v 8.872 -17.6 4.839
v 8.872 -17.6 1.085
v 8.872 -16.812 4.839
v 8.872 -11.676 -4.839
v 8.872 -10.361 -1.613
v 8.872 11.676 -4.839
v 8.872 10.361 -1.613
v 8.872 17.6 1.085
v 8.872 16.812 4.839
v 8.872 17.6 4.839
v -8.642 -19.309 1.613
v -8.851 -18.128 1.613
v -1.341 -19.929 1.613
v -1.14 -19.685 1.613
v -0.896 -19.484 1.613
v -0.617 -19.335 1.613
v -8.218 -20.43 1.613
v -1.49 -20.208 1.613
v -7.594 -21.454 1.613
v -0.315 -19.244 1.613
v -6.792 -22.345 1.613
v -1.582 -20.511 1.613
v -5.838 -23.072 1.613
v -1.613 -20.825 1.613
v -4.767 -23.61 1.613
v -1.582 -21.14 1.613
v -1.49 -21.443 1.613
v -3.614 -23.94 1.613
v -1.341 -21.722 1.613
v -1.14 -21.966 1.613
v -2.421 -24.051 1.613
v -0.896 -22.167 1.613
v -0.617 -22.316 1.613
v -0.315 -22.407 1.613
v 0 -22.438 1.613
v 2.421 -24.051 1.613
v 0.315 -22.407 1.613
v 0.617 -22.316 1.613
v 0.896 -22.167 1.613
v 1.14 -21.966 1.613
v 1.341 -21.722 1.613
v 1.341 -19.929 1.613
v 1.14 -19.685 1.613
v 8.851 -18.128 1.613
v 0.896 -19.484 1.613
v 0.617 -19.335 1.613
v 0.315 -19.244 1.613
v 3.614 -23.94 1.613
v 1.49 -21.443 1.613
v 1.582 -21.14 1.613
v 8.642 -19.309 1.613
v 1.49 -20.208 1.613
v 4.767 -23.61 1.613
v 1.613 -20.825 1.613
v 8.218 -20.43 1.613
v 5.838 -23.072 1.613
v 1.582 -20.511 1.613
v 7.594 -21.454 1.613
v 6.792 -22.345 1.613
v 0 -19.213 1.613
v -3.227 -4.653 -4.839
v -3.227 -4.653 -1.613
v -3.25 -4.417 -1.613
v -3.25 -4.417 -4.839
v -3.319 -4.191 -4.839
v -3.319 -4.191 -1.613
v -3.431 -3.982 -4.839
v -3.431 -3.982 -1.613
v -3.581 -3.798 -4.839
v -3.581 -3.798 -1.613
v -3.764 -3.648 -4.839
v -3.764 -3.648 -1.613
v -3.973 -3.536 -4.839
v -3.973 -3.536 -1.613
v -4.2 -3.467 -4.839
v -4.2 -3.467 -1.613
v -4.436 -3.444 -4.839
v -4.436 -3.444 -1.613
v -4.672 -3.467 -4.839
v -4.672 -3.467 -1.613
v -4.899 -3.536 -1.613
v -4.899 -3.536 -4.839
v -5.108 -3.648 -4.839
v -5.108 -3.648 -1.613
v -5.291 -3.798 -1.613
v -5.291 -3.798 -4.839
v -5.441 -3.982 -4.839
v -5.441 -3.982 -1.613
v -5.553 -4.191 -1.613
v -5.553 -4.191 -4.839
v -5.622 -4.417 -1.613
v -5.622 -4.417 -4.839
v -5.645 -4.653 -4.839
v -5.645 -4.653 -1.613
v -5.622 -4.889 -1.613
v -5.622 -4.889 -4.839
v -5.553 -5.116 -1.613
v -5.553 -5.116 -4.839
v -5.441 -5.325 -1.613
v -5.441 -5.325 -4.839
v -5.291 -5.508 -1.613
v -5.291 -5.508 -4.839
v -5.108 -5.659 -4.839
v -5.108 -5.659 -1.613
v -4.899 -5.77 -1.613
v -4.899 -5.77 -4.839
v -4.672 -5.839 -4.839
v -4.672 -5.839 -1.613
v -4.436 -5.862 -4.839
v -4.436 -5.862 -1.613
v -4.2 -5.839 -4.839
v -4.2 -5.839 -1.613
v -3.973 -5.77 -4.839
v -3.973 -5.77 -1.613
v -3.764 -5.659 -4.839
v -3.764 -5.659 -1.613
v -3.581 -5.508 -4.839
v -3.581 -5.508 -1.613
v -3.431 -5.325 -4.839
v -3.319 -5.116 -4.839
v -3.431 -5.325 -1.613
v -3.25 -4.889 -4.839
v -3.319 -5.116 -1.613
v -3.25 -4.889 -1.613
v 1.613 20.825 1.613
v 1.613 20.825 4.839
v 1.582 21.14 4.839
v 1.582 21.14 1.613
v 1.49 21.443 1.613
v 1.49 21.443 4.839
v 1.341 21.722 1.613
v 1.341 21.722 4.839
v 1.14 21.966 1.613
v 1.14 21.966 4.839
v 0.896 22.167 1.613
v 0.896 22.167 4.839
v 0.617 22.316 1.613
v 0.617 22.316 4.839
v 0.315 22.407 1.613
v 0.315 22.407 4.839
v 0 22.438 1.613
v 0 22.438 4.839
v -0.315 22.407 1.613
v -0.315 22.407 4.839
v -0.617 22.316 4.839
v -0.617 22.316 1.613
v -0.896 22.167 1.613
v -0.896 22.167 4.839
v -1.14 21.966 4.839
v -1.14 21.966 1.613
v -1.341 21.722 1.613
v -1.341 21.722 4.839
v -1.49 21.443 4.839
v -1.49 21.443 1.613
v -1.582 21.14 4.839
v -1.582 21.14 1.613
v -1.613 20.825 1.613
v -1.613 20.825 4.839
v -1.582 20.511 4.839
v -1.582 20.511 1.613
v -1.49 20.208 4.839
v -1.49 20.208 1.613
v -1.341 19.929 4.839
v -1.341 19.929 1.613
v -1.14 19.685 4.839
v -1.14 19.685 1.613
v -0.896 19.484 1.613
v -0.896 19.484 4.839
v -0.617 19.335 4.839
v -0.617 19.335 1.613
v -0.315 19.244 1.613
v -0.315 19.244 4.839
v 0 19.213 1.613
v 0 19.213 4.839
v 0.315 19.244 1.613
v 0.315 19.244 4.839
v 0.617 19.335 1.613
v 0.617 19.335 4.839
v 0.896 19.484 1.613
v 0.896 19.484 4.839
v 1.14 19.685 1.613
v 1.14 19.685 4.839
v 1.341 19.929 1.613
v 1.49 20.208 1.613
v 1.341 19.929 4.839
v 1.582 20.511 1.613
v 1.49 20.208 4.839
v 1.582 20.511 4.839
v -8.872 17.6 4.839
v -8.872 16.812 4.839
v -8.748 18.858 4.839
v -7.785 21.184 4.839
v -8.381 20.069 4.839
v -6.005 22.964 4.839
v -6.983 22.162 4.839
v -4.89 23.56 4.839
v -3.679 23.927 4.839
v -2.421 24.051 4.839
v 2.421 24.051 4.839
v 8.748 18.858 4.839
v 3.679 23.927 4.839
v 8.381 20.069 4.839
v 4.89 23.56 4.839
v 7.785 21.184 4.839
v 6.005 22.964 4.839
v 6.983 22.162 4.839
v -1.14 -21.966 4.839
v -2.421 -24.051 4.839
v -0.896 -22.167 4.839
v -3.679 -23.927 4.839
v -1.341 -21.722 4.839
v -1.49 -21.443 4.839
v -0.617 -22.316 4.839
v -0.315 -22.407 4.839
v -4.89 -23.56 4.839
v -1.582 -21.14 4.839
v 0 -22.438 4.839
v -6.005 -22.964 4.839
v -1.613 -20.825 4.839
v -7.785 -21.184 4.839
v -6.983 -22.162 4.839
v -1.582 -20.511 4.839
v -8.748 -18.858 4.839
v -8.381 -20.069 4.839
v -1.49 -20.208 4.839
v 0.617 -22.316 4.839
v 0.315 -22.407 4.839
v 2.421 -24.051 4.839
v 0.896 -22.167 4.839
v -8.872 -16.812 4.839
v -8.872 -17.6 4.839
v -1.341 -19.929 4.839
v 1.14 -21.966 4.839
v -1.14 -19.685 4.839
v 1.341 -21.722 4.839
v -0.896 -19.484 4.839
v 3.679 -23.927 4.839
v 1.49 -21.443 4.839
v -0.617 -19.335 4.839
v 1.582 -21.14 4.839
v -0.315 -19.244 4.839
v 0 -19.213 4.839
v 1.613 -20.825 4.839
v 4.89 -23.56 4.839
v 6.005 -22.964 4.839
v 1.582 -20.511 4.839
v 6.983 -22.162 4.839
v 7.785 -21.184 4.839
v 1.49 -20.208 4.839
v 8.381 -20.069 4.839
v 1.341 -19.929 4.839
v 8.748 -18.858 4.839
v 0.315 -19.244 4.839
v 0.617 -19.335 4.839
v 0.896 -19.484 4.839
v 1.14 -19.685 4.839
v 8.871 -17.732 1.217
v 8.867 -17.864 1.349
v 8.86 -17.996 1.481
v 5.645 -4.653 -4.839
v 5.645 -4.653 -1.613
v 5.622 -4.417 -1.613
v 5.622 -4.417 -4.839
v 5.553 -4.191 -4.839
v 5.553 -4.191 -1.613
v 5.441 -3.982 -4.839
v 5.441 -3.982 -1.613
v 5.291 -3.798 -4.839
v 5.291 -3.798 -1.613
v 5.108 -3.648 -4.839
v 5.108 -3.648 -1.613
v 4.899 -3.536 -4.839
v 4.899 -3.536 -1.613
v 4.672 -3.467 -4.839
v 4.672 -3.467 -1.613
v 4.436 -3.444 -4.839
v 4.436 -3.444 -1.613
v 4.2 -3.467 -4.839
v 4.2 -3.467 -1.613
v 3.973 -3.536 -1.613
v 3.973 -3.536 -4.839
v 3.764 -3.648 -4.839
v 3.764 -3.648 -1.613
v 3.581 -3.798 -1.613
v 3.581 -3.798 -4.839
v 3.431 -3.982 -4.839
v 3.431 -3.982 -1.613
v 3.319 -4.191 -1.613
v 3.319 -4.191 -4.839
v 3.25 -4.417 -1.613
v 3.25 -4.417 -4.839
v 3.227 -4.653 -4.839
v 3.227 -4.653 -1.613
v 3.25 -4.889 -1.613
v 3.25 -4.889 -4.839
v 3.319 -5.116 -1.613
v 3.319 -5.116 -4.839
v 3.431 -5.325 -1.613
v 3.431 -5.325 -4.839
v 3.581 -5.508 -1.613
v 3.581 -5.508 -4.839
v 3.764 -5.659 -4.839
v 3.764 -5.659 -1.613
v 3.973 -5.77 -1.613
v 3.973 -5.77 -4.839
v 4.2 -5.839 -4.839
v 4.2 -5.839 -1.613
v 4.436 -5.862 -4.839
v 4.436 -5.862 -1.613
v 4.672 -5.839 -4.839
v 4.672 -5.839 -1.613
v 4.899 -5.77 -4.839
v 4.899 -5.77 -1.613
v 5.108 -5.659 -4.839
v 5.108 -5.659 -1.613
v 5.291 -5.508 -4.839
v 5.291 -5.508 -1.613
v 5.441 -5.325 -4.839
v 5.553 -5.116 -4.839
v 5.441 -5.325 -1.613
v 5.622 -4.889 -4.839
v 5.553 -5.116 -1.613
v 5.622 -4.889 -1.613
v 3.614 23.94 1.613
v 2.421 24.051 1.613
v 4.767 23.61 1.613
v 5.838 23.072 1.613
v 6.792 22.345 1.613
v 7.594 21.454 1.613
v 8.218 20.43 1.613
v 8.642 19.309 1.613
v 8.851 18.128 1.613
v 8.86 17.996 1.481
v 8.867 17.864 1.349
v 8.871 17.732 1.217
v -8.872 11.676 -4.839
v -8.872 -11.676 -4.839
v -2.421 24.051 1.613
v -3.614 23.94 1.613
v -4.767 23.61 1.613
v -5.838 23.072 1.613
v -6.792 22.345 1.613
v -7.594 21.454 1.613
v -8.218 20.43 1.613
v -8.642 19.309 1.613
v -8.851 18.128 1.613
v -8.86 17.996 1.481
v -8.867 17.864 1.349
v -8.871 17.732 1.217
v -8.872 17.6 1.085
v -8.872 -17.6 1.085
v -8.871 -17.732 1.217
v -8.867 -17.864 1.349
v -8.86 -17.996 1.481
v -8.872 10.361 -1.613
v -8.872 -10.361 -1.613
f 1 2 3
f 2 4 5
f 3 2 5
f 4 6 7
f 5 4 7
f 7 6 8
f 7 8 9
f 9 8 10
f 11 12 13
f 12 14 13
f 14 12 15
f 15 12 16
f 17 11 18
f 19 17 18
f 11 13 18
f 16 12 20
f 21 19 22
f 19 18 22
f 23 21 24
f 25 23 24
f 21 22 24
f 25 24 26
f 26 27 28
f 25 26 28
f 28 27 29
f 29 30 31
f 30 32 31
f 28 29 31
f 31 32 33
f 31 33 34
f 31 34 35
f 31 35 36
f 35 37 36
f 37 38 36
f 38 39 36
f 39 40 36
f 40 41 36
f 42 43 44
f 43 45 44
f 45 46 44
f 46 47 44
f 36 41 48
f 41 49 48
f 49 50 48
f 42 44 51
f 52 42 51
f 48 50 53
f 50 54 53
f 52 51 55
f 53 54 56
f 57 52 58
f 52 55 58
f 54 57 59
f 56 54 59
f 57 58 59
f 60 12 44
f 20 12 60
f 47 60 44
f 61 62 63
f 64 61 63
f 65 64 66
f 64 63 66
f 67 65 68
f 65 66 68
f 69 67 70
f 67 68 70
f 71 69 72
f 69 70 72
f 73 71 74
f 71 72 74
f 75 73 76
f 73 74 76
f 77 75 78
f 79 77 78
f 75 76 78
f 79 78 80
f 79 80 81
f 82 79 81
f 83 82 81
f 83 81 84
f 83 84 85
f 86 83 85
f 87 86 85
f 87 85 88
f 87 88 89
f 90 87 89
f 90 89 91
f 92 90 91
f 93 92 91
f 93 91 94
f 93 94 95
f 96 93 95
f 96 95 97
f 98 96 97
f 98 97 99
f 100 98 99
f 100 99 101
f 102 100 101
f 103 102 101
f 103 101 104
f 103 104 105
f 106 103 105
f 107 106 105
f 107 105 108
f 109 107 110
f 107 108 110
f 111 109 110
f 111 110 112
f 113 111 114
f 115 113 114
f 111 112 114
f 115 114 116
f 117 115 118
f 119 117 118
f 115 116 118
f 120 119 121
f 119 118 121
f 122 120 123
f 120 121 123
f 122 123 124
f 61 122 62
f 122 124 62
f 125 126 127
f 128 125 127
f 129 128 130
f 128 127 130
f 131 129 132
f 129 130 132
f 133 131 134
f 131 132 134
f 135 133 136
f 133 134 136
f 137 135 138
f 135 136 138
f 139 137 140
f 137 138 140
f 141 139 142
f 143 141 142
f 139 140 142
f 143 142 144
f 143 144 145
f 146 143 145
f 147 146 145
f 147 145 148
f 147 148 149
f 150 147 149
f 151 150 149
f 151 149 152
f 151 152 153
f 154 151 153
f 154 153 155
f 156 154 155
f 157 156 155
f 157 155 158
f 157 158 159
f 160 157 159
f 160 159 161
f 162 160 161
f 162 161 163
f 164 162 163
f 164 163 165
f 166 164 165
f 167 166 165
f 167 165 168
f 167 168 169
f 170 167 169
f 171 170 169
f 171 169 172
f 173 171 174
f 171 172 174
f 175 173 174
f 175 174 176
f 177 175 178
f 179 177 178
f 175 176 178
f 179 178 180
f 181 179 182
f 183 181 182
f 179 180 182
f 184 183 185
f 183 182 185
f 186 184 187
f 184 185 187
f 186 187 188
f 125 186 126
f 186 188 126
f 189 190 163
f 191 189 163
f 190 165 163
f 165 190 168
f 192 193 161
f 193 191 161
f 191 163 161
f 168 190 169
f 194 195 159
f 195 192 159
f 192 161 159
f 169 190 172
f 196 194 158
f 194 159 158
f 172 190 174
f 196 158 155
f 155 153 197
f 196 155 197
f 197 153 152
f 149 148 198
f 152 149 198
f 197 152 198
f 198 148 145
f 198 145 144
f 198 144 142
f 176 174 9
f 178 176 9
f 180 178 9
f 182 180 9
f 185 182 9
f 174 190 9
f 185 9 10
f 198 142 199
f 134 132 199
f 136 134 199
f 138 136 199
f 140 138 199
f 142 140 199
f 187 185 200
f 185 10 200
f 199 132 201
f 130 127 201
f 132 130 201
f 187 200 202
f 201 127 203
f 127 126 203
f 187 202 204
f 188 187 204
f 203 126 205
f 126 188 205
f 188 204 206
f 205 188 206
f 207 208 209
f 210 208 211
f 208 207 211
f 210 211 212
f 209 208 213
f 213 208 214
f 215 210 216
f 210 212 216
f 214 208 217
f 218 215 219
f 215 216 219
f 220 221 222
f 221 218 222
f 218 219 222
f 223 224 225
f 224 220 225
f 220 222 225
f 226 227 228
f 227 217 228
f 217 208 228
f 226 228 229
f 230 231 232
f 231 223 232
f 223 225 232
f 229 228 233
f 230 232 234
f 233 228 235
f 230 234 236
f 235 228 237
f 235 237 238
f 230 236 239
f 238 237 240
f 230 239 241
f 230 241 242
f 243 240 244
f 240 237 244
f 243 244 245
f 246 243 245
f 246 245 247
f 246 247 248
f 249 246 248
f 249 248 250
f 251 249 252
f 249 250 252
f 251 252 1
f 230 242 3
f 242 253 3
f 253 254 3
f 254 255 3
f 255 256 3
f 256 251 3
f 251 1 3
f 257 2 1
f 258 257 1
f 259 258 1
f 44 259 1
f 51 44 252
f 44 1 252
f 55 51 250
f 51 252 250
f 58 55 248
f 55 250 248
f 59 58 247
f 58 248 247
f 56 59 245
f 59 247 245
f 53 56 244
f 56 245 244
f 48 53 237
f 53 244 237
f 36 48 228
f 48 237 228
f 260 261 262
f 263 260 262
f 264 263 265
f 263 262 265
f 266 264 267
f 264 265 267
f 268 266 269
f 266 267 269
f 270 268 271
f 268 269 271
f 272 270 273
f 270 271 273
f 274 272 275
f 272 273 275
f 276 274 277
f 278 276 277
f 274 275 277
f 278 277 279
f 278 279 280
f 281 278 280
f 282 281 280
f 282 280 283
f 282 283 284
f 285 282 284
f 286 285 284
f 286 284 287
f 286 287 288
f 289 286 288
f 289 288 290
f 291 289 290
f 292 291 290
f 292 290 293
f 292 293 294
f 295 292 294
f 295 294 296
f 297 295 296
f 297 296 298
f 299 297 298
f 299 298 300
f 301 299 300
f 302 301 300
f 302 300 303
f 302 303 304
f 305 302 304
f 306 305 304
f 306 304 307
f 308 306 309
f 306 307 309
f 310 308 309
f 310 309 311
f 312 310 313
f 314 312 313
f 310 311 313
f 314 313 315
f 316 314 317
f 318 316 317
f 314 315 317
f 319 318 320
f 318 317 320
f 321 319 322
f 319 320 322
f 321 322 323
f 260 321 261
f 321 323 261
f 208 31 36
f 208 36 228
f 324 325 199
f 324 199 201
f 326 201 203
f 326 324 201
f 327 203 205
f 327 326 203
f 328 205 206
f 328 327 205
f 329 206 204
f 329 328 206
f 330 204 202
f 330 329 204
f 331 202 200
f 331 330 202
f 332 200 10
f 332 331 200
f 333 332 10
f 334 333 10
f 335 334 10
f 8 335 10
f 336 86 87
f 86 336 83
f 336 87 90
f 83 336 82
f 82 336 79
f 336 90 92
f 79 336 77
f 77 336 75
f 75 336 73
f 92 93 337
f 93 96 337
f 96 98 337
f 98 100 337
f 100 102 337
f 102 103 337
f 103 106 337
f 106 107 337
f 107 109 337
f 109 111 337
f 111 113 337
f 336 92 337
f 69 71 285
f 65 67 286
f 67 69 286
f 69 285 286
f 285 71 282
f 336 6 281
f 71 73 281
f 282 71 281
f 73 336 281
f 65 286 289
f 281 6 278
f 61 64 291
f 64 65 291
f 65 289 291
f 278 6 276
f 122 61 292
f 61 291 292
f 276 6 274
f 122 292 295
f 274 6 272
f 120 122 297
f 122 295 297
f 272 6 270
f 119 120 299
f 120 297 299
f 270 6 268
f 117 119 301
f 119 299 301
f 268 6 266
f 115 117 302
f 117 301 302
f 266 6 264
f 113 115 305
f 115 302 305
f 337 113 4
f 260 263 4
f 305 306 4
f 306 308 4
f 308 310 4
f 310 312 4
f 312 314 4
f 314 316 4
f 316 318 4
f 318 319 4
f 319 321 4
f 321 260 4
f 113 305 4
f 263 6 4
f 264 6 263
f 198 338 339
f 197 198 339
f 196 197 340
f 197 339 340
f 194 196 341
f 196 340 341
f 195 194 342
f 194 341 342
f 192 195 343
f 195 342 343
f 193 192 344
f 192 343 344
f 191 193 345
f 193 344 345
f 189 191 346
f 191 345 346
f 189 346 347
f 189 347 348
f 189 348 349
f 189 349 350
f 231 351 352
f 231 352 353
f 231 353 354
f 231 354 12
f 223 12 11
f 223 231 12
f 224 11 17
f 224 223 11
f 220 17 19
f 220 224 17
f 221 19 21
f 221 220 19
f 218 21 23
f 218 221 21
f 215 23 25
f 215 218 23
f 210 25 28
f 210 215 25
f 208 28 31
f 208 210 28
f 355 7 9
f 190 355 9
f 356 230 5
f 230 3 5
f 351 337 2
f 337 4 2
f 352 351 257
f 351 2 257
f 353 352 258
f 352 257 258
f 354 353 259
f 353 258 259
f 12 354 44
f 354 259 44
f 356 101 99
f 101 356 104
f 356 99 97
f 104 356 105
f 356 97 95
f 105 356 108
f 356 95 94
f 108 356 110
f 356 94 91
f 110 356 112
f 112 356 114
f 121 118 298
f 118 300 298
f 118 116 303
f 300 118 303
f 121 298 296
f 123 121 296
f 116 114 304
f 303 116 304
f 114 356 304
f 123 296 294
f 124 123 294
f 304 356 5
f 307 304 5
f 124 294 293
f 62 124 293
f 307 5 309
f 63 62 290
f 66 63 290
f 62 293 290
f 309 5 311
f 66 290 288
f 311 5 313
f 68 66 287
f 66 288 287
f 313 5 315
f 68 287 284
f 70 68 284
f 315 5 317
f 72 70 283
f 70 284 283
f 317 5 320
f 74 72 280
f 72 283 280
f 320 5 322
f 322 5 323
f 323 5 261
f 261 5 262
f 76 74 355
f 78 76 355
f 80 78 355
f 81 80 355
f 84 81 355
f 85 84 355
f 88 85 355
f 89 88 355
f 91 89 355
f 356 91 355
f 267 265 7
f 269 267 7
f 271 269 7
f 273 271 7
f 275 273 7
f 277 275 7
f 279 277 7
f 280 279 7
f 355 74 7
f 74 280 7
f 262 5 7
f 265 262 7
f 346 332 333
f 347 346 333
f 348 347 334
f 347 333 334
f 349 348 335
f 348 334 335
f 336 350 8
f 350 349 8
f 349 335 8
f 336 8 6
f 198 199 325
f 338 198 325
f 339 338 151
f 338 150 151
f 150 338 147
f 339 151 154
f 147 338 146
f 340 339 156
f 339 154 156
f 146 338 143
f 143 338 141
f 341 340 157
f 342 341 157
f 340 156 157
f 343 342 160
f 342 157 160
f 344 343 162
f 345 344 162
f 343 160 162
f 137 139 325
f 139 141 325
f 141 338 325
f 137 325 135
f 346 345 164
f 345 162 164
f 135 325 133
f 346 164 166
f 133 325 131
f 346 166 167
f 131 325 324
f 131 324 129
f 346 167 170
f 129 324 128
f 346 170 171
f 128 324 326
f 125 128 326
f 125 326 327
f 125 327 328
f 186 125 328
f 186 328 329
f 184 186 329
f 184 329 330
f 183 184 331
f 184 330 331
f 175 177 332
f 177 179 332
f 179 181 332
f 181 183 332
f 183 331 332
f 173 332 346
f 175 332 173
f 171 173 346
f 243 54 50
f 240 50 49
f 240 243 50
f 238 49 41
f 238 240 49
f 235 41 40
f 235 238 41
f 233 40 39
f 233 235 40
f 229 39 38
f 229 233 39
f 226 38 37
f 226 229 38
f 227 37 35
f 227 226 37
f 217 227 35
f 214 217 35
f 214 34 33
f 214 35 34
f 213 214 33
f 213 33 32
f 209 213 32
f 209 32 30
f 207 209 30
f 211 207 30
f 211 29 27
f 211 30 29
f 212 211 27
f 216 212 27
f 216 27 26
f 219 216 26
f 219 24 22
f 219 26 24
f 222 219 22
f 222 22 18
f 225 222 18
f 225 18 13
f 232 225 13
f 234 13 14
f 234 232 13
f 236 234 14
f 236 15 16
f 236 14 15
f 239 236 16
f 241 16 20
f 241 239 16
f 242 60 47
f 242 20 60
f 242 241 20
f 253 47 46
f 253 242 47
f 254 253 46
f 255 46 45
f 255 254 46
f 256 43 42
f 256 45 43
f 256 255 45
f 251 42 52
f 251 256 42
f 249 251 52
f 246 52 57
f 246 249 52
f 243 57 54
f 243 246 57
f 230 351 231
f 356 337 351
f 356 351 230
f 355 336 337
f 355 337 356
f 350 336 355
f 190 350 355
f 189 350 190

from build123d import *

# Parameters (mm, degrees)
BOSS_EXTRUDE1_DEPTH      = 8.87222
BOSS_EXTRUDE1_DEPTH_BACK = 8.87222
SKETCH2_R                = 1.6129
CUT_EXTRUDE1_DEPTH       = 28.401304094
SKETCH3_R                = 1.20904
CUT_EXTRUDE2_DEPTH       = 27.434873517
FILLET1_R                = 6.4516


with BuildPart() as part:
    # Sketch1 → Boss-Extrude1 (new, two sides: drawn at the far end of the back side and taken through both)
    with BuildSketch(Plane(origin=(0, 0, 0), x_dir=(0, 0, -1), z_dir=(1, 0, 0)).offset(-BOSS_EXTRUDE1_DEPTH_BACK)):
        Polygon((-4.8387, 24.05126), (-1.6129, 24.05126), (-1.6129, 18.12798), (4.8387, 11.67638), (4.8387, -11.67638), (-1.6129, -18.12798), (-1.6129, -24.05126), (-4.8387, -24.05126), (-4.8387, -16.81226), (1.6129, -10.36066), (1.6129, 10.36066), (-4.8387, 16.81226), align=None)
    extrude(amount=BOSS_EXTRUDE1_DEPTH + BOSS_EXTRUDE1_DEPTH_BACK)

    # Sketch2 → Cut-Extrude1 (cut, through all)
    with BuildSketch(Plane.XY.offset(4.8387)):
        with Locations((0, 20.82546)):
            Circle(SKETCH2_R)
    cut_extrude1 = extrude(amount=-CUT_EXTRUDE1_DEPTH, mode=Mode.SUBTRACT)

    # Mirror1: Cut-Extrude1 across plane
    add(cut_extrude1.mirror(Plane.ZX), mode=Mode.SUBTRACT)

    # Sketch3 → Cut-Extrude2 (cut, through all)
    with BuildSketch(Plane.XY.offset(-1.6129)):
        with Locations((-4.43611, -4.65328)):
            Circle(SKETCH3_R)
        with Locations((4.43611, -4.65328)):
            Circle(SKETCH3_R)
    extrude(amount=-CUT_EXTRUDE2_DEPTH, mode=Mode.SUBTRACT)

    # Fillet1
    fillet1_edges = [part.edges().sort_by_distance(p)[0] for p in [
        (-8.87222, -24.05126, 3.2258),
        (8.87222, -24.05126, 3.2258),
        (8.87222, 24.05126, 3.2258),
        (-8.87222, 24.05126, 3.2258),
    ]]
    fillet(fillet1_edges, radius=FILLET1_R)


solid = part.part
